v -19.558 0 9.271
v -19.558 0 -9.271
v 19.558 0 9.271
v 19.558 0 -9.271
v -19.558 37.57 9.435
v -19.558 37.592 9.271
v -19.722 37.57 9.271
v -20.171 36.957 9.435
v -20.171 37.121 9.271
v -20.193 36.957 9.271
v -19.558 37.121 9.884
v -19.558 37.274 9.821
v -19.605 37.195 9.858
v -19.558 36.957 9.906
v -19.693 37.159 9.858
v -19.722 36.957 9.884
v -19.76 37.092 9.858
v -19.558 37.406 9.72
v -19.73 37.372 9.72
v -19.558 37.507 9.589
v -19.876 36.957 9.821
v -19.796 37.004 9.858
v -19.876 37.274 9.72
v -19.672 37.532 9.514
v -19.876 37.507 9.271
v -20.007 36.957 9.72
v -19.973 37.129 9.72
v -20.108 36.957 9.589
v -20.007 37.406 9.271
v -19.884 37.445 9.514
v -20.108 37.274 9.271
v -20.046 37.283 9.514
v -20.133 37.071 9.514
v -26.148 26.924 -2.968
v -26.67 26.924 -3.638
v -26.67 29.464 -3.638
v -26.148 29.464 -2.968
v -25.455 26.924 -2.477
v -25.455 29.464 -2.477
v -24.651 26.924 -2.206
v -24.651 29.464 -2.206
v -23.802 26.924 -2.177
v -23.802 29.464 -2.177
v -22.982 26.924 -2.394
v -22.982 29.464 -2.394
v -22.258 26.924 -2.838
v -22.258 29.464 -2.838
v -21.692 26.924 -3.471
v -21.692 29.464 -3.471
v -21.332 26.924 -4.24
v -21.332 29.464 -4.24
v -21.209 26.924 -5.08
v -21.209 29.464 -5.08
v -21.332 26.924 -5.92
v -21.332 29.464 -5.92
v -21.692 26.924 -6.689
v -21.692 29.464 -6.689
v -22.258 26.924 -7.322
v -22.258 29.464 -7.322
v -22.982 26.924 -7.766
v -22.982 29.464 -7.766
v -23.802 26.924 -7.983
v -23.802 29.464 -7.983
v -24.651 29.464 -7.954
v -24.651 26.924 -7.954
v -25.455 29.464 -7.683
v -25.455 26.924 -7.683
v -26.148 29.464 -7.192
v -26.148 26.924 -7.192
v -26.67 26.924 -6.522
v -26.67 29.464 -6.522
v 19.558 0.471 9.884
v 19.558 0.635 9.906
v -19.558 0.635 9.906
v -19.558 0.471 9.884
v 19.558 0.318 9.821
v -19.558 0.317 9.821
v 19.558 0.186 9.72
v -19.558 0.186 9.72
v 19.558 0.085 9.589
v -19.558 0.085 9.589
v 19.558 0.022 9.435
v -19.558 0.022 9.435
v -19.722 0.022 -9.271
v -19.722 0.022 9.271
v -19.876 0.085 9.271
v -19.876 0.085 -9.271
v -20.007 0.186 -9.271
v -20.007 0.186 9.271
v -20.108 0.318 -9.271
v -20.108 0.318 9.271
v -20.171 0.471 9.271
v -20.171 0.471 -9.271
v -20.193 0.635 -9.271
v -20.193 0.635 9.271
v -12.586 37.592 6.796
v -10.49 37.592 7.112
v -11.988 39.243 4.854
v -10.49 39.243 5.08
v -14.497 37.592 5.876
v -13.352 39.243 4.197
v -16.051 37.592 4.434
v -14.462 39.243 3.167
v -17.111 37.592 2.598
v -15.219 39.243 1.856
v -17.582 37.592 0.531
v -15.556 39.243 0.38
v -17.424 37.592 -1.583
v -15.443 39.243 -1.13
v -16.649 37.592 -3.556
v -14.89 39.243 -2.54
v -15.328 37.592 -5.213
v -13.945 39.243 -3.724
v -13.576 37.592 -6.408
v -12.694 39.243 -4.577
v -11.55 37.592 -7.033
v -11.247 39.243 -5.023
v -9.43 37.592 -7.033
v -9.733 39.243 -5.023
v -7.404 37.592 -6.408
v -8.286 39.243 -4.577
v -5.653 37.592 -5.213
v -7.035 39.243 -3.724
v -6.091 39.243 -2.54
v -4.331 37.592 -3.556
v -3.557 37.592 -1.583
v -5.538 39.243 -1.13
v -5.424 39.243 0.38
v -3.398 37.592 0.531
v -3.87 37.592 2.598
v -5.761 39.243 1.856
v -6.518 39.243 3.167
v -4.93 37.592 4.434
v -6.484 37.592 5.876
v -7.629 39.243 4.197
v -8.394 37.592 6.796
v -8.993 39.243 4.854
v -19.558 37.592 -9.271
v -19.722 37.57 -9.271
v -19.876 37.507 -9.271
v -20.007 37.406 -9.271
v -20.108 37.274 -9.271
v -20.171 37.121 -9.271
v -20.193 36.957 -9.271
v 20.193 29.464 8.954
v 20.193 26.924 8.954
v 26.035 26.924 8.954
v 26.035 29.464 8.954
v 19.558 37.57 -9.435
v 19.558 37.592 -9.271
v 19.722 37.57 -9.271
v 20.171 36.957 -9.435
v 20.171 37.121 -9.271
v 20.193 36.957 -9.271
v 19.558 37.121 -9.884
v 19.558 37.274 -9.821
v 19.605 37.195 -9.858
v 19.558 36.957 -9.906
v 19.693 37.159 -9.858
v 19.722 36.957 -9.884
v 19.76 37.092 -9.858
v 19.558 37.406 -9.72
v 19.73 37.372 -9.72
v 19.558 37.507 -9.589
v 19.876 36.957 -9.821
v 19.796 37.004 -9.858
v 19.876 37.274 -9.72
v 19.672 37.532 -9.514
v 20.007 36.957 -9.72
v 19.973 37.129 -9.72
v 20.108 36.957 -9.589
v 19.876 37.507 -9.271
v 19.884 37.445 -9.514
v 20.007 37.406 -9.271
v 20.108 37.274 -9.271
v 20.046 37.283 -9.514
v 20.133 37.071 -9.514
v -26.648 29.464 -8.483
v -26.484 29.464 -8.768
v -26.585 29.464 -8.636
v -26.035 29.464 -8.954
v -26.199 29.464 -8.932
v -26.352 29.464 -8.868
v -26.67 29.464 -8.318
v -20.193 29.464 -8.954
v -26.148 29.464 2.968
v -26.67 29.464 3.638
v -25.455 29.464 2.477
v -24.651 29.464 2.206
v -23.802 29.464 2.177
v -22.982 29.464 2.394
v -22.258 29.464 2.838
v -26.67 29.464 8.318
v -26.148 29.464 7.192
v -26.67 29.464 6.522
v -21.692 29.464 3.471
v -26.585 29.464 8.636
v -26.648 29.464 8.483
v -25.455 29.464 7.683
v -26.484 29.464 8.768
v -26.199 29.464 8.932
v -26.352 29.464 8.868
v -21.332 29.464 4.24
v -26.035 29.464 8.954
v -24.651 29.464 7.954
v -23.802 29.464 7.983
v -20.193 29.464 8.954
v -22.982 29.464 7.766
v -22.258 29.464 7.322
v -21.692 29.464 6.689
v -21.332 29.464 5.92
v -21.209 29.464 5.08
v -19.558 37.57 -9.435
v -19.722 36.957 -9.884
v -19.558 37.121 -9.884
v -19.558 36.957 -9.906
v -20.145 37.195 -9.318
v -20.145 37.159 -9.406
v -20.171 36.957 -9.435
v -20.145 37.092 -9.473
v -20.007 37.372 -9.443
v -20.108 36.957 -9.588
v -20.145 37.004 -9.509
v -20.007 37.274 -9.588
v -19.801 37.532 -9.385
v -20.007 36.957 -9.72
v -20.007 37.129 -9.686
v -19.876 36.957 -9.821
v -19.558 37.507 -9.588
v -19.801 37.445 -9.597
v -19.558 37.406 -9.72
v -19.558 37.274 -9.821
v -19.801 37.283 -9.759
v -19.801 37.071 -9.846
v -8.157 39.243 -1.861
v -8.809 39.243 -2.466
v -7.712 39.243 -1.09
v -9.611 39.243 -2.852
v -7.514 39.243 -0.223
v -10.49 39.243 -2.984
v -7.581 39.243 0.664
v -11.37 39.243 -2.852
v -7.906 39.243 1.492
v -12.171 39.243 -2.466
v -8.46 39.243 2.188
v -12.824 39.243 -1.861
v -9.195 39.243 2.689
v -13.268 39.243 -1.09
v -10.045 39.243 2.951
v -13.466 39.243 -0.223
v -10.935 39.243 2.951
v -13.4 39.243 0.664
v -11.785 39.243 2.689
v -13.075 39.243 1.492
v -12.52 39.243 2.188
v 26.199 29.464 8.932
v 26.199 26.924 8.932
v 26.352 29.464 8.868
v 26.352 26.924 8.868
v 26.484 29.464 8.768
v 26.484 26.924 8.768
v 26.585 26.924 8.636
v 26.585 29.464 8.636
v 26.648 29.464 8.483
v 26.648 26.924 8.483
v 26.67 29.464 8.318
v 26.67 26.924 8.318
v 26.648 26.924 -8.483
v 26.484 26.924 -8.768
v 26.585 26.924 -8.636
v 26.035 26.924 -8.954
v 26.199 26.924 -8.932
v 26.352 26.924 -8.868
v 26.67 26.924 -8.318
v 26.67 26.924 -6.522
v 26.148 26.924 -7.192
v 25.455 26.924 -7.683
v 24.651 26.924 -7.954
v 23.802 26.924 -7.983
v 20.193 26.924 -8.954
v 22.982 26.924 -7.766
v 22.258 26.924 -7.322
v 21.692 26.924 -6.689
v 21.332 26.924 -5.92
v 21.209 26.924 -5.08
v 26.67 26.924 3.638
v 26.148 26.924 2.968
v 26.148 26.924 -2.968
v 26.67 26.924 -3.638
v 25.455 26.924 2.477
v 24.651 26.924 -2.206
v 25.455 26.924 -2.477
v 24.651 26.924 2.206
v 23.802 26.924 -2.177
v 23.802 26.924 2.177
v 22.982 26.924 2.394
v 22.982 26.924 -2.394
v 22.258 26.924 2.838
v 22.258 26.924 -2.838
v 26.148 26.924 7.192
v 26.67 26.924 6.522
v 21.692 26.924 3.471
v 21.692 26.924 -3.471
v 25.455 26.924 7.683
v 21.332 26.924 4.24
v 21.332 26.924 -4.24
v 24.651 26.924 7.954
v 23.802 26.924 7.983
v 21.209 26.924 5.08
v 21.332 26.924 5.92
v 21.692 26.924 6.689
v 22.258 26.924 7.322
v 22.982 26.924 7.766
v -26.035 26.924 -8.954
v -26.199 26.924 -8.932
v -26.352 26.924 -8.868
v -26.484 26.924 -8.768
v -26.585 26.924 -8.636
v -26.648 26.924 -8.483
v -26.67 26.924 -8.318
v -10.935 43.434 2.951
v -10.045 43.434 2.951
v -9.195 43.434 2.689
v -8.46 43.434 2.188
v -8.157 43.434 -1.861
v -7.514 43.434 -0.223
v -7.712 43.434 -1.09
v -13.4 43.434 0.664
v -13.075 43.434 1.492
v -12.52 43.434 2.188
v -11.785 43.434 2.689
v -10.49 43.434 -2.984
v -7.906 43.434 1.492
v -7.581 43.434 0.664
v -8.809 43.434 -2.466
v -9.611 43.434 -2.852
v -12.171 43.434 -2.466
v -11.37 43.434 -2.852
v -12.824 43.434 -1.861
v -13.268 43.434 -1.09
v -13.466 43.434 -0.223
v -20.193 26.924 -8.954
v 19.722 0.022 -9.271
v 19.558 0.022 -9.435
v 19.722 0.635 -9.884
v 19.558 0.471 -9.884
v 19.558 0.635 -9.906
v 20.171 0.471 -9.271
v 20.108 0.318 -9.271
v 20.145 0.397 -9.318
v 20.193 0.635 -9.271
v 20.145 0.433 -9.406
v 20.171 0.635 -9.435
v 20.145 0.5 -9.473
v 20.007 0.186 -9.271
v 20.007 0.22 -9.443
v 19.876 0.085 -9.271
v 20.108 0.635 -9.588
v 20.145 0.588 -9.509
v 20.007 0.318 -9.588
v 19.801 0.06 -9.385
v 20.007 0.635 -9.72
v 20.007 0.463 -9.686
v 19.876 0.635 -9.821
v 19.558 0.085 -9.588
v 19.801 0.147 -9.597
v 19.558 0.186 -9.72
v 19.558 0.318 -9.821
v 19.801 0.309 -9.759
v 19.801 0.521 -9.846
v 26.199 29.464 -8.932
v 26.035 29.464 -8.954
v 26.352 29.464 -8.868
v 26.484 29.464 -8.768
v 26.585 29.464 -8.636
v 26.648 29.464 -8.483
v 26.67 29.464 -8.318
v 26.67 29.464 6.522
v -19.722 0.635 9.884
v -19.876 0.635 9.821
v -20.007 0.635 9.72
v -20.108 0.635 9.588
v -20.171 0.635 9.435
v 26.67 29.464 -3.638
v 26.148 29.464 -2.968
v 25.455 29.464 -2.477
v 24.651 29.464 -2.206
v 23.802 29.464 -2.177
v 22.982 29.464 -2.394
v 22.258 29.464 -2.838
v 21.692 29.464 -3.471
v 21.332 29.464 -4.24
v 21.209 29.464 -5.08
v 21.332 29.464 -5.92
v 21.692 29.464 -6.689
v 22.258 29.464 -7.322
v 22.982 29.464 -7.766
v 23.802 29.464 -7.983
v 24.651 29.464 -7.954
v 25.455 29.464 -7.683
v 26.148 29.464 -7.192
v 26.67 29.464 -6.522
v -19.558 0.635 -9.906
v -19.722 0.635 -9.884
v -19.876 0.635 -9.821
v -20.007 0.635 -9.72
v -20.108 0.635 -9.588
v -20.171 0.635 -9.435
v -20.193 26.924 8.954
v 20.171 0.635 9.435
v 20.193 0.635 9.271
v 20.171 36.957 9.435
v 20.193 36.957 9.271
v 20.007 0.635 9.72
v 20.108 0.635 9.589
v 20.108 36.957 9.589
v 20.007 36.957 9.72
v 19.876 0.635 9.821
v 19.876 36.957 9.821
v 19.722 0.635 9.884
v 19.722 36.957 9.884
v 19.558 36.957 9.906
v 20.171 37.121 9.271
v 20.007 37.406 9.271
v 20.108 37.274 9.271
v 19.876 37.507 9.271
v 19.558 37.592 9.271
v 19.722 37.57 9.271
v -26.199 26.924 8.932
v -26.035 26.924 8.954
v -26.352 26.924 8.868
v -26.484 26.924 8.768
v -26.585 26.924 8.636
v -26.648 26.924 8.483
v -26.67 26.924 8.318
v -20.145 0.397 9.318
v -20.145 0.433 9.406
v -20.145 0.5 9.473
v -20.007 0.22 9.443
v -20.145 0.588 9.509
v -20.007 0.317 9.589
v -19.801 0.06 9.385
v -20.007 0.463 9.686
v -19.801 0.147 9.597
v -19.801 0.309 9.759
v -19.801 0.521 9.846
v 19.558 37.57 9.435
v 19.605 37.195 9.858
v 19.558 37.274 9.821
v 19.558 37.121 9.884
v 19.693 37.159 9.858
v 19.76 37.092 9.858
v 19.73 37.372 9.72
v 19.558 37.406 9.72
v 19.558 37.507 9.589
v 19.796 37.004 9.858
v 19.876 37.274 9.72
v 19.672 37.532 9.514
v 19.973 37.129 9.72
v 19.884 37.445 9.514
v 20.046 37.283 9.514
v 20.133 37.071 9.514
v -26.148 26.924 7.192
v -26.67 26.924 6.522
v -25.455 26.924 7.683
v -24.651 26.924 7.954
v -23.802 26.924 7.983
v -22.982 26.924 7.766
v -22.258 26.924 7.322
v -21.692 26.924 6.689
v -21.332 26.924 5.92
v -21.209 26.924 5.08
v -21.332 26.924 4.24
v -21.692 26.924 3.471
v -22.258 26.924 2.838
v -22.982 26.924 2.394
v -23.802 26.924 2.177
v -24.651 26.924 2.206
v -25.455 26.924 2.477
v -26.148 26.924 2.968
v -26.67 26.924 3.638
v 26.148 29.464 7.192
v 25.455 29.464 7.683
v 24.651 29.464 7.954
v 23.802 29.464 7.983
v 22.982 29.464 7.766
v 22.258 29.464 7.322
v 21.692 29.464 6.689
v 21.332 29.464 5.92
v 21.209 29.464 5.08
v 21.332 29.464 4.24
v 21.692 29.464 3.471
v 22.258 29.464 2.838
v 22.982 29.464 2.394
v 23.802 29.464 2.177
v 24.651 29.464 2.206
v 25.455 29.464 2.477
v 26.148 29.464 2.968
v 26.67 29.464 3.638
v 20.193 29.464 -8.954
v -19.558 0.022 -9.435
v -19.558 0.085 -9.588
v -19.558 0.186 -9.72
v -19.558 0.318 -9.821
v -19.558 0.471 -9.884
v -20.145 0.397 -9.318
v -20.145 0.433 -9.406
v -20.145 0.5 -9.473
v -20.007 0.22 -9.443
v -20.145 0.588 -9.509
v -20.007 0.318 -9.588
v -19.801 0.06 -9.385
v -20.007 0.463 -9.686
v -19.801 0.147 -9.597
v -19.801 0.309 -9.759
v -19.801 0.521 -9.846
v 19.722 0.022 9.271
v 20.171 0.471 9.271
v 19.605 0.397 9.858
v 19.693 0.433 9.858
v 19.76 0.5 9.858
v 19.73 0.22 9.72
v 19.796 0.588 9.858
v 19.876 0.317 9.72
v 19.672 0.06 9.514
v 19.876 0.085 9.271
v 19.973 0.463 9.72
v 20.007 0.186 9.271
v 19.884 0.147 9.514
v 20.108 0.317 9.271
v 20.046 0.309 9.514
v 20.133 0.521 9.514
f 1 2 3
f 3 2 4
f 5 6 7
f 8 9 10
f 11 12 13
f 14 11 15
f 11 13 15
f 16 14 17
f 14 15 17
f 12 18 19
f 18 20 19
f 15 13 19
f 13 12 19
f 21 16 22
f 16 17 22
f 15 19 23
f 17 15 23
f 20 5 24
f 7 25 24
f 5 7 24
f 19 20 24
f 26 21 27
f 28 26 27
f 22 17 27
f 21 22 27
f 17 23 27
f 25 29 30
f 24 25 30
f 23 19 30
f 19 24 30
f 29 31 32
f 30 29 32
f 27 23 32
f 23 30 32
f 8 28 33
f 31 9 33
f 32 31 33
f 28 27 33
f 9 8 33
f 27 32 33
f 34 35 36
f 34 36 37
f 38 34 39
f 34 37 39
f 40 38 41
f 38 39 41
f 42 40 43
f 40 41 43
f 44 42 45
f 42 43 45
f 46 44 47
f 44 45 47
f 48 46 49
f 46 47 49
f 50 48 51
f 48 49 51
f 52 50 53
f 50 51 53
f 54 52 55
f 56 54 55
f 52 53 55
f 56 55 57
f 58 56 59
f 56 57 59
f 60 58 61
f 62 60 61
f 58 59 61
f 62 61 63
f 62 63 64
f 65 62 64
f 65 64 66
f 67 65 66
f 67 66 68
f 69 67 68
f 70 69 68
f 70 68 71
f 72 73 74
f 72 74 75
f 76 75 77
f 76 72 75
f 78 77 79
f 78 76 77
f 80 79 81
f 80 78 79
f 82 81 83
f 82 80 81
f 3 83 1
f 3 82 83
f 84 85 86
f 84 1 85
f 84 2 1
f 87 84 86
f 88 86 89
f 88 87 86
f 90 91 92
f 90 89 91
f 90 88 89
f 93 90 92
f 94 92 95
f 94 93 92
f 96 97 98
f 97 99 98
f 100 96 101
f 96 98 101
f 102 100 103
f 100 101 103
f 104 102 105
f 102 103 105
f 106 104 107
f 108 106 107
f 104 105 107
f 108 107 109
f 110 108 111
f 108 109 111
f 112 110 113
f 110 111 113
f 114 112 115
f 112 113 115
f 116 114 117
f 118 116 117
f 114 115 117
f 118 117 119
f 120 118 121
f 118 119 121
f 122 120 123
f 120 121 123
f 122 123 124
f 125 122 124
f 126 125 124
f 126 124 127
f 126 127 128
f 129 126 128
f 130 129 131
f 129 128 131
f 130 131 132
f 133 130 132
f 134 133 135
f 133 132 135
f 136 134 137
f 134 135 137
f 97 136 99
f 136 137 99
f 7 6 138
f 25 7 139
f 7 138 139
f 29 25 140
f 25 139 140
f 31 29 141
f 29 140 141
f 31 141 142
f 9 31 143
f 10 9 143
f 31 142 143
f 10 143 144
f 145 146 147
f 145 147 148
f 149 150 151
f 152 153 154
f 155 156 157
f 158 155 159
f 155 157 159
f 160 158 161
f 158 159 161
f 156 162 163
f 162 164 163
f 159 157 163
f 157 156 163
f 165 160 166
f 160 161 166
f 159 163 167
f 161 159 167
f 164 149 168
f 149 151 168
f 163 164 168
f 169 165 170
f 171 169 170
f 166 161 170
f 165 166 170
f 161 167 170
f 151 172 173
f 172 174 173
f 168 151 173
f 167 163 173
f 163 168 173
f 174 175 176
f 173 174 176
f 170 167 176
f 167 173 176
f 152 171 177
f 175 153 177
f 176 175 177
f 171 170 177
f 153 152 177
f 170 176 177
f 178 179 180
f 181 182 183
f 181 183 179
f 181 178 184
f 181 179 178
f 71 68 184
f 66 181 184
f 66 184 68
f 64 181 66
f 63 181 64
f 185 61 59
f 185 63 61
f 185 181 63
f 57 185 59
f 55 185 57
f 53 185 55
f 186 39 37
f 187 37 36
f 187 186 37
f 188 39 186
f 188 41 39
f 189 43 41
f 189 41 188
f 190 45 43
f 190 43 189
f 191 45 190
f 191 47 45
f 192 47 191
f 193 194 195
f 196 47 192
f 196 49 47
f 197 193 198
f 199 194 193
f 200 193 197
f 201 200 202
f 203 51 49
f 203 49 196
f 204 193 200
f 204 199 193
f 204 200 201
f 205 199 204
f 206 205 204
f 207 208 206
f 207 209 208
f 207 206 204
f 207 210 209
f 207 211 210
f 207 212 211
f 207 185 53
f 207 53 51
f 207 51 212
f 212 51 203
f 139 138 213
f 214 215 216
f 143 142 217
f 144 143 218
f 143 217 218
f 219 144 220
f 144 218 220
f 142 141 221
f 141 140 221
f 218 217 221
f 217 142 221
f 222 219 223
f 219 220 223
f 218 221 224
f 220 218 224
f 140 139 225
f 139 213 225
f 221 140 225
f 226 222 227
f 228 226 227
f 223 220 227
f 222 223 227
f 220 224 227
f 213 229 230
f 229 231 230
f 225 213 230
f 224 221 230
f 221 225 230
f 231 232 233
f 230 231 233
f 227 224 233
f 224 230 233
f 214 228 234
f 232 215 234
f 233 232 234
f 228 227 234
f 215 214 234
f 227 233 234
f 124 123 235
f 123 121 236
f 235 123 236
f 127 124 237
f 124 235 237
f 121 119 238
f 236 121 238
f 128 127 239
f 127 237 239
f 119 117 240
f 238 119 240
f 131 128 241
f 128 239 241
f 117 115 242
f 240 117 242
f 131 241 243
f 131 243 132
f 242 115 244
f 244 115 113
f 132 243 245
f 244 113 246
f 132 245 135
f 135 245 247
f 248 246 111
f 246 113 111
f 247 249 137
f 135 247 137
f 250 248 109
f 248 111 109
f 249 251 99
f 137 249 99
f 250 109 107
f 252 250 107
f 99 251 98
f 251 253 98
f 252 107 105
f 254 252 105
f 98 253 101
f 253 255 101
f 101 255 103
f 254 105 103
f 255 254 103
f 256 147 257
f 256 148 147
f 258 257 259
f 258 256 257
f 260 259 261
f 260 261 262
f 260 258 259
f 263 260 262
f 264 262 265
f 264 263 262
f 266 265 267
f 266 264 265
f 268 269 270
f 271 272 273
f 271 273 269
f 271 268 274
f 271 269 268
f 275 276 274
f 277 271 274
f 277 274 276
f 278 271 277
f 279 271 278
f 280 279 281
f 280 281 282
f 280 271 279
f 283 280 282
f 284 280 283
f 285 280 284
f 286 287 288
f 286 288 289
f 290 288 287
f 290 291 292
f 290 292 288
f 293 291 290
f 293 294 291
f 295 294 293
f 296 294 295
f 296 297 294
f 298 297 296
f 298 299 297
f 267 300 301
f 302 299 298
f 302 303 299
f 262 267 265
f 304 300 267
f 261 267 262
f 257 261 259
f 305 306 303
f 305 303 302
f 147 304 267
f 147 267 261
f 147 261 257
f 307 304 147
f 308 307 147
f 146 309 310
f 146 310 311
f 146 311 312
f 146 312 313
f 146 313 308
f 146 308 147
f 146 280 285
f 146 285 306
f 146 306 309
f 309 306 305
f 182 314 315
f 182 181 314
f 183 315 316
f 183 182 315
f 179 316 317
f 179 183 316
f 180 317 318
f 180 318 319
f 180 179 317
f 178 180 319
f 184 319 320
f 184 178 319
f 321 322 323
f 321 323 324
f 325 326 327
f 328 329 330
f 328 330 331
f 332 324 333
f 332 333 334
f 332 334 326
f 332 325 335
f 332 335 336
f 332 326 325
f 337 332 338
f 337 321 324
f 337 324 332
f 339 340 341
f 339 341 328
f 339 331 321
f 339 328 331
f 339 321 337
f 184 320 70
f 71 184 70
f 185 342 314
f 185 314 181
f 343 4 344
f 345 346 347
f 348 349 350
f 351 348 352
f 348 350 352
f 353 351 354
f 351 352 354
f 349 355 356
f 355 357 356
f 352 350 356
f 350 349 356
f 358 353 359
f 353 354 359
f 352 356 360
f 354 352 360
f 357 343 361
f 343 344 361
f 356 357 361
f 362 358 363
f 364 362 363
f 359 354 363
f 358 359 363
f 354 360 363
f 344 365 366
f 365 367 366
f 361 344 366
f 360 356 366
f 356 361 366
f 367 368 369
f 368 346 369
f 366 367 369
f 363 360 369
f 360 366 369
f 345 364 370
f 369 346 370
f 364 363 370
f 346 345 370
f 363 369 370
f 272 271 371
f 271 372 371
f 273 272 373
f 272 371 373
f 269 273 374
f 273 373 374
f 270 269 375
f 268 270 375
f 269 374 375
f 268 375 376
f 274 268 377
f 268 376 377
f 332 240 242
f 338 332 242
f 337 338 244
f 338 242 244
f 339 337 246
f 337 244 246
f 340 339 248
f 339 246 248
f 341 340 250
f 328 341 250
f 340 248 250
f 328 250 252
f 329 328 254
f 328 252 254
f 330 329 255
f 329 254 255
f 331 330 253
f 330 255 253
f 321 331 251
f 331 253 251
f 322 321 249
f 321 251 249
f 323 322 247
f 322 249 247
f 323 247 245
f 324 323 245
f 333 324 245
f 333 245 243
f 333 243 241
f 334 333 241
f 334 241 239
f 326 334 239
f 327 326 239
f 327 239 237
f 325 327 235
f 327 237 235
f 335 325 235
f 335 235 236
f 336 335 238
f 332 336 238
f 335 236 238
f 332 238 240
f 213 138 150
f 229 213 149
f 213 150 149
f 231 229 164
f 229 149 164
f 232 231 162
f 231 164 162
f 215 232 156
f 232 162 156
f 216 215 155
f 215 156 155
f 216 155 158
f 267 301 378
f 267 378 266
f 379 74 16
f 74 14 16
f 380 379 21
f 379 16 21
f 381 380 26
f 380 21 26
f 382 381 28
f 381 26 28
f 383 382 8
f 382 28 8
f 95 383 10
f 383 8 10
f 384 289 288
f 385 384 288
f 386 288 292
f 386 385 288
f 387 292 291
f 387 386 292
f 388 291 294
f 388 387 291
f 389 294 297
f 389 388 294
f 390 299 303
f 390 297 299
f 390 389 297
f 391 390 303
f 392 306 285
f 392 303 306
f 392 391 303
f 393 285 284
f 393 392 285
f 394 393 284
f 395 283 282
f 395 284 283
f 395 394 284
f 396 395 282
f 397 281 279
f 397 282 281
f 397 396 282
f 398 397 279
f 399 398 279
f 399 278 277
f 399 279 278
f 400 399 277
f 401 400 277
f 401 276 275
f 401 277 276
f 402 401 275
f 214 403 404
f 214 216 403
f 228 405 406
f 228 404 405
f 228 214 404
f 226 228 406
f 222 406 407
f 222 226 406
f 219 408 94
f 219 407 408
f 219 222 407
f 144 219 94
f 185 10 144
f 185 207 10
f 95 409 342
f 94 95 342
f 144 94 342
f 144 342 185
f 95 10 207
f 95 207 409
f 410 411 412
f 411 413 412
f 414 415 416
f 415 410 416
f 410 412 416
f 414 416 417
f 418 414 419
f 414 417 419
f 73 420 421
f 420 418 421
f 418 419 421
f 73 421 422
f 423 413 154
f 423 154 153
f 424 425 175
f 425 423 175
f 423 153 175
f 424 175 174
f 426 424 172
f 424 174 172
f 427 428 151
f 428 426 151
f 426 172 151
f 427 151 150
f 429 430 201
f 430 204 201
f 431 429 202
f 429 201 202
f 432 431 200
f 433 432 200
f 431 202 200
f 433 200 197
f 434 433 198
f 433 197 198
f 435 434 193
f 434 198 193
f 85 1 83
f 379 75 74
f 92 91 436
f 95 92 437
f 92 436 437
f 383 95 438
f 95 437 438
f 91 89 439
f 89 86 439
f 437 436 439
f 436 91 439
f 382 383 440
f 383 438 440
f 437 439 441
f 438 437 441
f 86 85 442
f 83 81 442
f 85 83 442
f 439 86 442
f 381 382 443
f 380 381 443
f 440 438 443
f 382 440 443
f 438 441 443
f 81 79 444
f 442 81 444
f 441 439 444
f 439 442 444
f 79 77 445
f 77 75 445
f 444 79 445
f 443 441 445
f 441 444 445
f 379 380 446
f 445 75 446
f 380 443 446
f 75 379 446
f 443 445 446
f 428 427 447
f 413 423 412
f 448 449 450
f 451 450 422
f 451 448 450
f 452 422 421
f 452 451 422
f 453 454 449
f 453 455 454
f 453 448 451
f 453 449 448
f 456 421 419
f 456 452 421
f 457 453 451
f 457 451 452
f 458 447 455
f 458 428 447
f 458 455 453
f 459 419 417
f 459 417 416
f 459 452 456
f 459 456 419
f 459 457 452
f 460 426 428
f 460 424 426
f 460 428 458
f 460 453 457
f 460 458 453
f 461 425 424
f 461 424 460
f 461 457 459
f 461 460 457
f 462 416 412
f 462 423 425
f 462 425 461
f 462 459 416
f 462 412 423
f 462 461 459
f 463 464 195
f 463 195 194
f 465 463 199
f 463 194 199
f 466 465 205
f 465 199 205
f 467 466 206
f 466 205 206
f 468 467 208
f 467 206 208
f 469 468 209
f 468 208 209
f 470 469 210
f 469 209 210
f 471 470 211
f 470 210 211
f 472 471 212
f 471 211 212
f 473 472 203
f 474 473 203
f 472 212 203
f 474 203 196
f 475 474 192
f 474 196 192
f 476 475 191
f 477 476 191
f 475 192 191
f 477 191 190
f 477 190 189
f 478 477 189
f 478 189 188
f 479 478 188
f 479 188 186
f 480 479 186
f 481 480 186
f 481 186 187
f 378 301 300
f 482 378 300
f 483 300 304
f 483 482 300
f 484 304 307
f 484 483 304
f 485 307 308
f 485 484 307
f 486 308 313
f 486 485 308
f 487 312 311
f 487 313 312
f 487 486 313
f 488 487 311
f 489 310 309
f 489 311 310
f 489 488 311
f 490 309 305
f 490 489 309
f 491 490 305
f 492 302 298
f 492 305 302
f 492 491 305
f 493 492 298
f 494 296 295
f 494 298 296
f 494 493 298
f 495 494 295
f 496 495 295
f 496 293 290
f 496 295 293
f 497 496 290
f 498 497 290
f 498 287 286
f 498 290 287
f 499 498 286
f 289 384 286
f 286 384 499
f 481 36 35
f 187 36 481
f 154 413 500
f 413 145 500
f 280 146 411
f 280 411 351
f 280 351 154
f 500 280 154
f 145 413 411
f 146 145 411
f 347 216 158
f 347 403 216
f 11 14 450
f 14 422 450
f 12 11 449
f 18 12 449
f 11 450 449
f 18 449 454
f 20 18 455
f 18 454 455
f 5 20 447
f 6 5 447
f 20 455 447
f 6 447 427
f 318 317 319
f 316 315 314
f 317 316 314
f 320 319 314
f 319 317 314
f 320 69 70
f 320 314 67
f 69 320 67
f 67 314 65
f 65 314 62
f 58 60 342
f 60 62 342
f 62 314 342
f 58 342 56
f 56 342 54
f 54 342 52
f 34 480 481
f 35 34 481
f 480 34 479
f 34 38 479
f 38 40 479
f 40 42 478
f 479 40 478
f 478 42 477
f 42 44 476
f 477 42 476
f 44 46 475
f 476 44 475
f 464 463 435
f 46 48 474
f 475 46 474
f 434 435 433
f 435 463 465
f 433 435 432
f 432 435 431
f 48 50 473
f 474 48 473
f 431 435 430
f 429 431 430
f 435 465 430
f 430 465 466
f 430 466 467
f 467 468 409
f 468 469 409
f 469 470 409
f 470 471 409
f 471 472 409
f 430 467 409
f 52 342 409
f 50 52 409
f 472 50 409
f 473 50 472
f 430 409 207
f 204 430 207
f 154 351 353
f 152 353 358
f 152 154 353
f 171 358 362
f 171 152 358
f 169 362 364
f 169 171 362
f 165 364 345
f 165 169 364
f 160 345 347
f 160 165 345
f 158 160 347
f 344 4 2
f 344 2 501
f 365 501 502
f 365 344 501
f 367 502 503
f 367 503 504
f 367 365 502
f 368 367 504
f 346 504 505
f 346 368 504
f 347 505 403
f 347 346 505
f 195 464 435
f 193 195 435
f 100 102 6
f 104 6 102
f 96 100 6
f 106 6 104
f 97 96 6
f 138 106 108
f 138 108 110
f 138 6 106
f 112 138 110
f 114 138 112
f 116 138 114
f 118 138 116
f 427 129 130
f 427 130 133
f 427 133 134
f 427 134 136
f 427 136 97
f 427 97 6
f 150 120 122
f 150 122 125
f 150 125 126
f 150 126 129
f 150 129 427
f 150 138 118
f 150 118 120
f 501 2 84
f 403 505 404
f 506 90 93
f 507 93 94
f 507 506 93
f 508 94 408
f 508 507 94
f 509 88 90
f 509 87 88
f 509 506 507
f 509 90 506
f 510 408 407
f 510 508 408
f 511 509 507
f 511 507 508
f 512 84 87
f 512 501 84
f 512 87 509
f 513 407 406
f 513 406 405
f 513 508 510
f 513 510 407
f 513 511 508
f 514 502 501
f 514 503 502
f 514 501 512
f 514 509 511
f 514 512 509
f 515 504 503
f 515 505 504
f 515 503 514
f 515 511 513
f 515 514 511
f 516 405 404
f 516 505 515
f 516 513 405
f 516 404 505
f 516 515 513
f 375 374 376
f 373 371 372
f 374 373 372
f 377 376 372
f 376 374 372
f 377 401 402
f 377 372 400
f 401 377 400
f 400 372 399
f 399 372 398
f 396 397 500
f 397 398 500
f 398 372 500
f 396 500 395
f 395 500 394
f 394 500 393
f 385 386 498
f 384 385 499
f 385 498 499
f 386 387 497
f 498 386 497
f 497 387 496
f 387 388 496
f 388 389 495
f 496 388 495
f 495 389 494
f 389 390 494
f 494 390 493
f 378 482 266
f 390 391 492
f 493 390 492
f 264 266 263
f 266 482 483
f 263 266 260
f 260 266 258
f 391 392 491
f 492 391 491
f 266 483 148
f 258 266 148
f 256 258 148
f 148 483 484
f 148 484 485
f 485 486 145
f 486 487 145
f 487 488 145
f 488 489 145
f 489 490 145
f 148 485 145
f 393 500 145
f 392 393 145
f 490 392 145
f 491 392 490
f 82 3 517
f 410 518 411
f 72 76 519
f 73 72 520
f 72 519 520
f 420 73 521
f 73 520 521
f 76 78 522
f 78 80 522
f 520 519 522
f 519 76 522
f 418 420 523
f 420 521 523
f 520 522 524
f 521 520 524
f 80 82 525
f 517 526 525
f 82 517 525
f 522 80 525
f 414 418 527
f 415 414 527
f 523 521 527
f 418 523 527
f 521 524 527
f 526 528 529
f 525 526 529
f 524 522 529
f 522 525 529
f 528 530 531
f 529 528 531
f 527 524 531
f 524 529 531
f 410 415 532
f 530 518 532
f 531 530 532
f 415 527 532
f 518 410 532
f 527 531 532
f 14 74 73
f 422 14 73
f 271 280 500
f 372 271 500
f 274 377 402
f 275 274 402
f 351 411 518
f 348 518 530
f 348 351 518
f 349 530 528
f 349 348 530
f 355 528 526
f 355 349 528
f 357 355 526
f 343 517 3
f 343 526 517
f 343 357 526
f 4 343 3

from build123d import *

# Parameters (mm, degrees)
BODY_W                      = 40.386
BODY_H                      = 19.812
SERVO_BODY_DEPTH            = 37.592
TAB_W                       = 17.907
TAB_H                       = 2.54
MOUNTING_TAB_DEPTH          = 6.477
FILLET1_R                   = 0.635
HOLES_R                     = 2.921
MOUNTING_HOLES_DEPTH        = 41.957844572
FILLET1_OF_MOUNTING_TAB_2_R = 0.635
SHAFT_R                     = 2.9845
SPLINE_SHAFT_DEPTH          = 4.191
FILLET2_R                   = 0.635


with BuildPart() as part:
    # body → servo_body (new body)
    with BuildSketch(Plane(origin=(0, 0, 0), x_dir=(1, 0, 0), z_dir=(0, 1, 0))):
        Rectangle(BODY_W, BODY_H)
    extrude(amount=SERVO_BODY_DEPTH)

    # tab → mounting_tab (add)
    with BuildSketch(Plane.ZY.offset(20.193)):
        with Locations((0, 28.194)):
            Rectangle(TAB_W, TAB_H)
    mounting_tab = extrude(amount=MOUNTING_TAB_DEPTH)

    # Fillet1
    fillet1_edges = [part.edges().sort_by_distance(p)[0] for p in [
        (-26.67, 28.194, -8.9535),
        (-26.67, 28.194, 8.9535),
    ]]
    fillet(fillet1_edges, radius=FILLET1_R)

    # holes → mounting_holes (cut, through all)
    with BuildSketch(Plane(origin=(0, 29.464, 0), x_dir=(-1, 0, 0), z_dir=(0, 1, 0))):
        with Locations((24.13, -5.08)):
            Circle(HOLES_R)
        with Locations((24.13, 5.08)):
            Circle(HOLES_R)
    mounting_holes = extrude(amount=-MOUNTING_HOLES_DEPTH, mode=Mode.SUBTRACT)

    # mounting_tab_2: mounting_tab, mounting_holes across plane
    add(mounting_tab.mirror(Plane(origin=(0, 0, 0), x_dir=(0, 0, 1), z_dir=(1, 0, 0))))
    add(mounting_holes.mirror(Plane(origin=(0, 0, 0), x_dir=(0, 0, 1), z_dir=(1, 0, 0))), mode=Mode.SUBTRACT)

    # Fillet1 of mounting_tab_2
    fillet1_of_mounting_tab_2_edges = [part.edges().sort_by_distance(p)[0] for p in [
        (26.67, 28.194, -8.9535),
        (26.67, 28.194, 8.9535),
    ]]
    fillet(fillet1_of_mounting_tab_2_edges, radius=FILLET1_OF_MOUNTING_TAB_2_R)

    # Sketch4 → Boss-Revolve1 (revolve)
    with BuildSketch(Plane.XY, mode=Mode.PRIVATE) as boss_revolve1_sk:
        Polygon((-10.4902, 37.592), (-3.3782, 37.592), (-5.4102, 39.243), (-10.4902, 39.243), align=None)
    revolve(boss_revolve1_sk.sketch.rotate(Axis((-10.4902, 39.598741813, 0), (0, -1, 0)), 90), axis=Axis((-10.4902, 39.598741813, 0), (0, -1, 0)))

    # shaft → spline_shaft (add)
    with BuildSketch(Plane(origin=(0, 39.243, 0), x_dir=(-1, 0, 0), z_dir=(0, 1, 0))):
        with Locations(Location((10.4902, 0, 0), (0, 0, 270))):
            Circle(SHAFT_R)
    extrude(amount=SPLINE_SHAFT_DEPTH)

    # Fillet2
    fillet2_edges = [part.edges().sort_by_distance(p)[0] for p in [
        (20.193, 37.592, 0),
        (0, 37.592, -9.906),
        (-20.193, 37.592, 0),
        (0, 0, -9.906),
        (20.193, 0, 0),
        (0, 0, 9.906),
        (-20.193, 0, 0),
        (0, 37.592, 9.906),
        (-20.193, 18.796, -9.906),
        (20.193, 18.796, -9.906),
        (20.193, 18.796, 9.906),
        (-20.193, 18.796, 9.906),
    ]]
    fillet(fillet2_edges, radius=FILLET2_R)


solid = part.part
